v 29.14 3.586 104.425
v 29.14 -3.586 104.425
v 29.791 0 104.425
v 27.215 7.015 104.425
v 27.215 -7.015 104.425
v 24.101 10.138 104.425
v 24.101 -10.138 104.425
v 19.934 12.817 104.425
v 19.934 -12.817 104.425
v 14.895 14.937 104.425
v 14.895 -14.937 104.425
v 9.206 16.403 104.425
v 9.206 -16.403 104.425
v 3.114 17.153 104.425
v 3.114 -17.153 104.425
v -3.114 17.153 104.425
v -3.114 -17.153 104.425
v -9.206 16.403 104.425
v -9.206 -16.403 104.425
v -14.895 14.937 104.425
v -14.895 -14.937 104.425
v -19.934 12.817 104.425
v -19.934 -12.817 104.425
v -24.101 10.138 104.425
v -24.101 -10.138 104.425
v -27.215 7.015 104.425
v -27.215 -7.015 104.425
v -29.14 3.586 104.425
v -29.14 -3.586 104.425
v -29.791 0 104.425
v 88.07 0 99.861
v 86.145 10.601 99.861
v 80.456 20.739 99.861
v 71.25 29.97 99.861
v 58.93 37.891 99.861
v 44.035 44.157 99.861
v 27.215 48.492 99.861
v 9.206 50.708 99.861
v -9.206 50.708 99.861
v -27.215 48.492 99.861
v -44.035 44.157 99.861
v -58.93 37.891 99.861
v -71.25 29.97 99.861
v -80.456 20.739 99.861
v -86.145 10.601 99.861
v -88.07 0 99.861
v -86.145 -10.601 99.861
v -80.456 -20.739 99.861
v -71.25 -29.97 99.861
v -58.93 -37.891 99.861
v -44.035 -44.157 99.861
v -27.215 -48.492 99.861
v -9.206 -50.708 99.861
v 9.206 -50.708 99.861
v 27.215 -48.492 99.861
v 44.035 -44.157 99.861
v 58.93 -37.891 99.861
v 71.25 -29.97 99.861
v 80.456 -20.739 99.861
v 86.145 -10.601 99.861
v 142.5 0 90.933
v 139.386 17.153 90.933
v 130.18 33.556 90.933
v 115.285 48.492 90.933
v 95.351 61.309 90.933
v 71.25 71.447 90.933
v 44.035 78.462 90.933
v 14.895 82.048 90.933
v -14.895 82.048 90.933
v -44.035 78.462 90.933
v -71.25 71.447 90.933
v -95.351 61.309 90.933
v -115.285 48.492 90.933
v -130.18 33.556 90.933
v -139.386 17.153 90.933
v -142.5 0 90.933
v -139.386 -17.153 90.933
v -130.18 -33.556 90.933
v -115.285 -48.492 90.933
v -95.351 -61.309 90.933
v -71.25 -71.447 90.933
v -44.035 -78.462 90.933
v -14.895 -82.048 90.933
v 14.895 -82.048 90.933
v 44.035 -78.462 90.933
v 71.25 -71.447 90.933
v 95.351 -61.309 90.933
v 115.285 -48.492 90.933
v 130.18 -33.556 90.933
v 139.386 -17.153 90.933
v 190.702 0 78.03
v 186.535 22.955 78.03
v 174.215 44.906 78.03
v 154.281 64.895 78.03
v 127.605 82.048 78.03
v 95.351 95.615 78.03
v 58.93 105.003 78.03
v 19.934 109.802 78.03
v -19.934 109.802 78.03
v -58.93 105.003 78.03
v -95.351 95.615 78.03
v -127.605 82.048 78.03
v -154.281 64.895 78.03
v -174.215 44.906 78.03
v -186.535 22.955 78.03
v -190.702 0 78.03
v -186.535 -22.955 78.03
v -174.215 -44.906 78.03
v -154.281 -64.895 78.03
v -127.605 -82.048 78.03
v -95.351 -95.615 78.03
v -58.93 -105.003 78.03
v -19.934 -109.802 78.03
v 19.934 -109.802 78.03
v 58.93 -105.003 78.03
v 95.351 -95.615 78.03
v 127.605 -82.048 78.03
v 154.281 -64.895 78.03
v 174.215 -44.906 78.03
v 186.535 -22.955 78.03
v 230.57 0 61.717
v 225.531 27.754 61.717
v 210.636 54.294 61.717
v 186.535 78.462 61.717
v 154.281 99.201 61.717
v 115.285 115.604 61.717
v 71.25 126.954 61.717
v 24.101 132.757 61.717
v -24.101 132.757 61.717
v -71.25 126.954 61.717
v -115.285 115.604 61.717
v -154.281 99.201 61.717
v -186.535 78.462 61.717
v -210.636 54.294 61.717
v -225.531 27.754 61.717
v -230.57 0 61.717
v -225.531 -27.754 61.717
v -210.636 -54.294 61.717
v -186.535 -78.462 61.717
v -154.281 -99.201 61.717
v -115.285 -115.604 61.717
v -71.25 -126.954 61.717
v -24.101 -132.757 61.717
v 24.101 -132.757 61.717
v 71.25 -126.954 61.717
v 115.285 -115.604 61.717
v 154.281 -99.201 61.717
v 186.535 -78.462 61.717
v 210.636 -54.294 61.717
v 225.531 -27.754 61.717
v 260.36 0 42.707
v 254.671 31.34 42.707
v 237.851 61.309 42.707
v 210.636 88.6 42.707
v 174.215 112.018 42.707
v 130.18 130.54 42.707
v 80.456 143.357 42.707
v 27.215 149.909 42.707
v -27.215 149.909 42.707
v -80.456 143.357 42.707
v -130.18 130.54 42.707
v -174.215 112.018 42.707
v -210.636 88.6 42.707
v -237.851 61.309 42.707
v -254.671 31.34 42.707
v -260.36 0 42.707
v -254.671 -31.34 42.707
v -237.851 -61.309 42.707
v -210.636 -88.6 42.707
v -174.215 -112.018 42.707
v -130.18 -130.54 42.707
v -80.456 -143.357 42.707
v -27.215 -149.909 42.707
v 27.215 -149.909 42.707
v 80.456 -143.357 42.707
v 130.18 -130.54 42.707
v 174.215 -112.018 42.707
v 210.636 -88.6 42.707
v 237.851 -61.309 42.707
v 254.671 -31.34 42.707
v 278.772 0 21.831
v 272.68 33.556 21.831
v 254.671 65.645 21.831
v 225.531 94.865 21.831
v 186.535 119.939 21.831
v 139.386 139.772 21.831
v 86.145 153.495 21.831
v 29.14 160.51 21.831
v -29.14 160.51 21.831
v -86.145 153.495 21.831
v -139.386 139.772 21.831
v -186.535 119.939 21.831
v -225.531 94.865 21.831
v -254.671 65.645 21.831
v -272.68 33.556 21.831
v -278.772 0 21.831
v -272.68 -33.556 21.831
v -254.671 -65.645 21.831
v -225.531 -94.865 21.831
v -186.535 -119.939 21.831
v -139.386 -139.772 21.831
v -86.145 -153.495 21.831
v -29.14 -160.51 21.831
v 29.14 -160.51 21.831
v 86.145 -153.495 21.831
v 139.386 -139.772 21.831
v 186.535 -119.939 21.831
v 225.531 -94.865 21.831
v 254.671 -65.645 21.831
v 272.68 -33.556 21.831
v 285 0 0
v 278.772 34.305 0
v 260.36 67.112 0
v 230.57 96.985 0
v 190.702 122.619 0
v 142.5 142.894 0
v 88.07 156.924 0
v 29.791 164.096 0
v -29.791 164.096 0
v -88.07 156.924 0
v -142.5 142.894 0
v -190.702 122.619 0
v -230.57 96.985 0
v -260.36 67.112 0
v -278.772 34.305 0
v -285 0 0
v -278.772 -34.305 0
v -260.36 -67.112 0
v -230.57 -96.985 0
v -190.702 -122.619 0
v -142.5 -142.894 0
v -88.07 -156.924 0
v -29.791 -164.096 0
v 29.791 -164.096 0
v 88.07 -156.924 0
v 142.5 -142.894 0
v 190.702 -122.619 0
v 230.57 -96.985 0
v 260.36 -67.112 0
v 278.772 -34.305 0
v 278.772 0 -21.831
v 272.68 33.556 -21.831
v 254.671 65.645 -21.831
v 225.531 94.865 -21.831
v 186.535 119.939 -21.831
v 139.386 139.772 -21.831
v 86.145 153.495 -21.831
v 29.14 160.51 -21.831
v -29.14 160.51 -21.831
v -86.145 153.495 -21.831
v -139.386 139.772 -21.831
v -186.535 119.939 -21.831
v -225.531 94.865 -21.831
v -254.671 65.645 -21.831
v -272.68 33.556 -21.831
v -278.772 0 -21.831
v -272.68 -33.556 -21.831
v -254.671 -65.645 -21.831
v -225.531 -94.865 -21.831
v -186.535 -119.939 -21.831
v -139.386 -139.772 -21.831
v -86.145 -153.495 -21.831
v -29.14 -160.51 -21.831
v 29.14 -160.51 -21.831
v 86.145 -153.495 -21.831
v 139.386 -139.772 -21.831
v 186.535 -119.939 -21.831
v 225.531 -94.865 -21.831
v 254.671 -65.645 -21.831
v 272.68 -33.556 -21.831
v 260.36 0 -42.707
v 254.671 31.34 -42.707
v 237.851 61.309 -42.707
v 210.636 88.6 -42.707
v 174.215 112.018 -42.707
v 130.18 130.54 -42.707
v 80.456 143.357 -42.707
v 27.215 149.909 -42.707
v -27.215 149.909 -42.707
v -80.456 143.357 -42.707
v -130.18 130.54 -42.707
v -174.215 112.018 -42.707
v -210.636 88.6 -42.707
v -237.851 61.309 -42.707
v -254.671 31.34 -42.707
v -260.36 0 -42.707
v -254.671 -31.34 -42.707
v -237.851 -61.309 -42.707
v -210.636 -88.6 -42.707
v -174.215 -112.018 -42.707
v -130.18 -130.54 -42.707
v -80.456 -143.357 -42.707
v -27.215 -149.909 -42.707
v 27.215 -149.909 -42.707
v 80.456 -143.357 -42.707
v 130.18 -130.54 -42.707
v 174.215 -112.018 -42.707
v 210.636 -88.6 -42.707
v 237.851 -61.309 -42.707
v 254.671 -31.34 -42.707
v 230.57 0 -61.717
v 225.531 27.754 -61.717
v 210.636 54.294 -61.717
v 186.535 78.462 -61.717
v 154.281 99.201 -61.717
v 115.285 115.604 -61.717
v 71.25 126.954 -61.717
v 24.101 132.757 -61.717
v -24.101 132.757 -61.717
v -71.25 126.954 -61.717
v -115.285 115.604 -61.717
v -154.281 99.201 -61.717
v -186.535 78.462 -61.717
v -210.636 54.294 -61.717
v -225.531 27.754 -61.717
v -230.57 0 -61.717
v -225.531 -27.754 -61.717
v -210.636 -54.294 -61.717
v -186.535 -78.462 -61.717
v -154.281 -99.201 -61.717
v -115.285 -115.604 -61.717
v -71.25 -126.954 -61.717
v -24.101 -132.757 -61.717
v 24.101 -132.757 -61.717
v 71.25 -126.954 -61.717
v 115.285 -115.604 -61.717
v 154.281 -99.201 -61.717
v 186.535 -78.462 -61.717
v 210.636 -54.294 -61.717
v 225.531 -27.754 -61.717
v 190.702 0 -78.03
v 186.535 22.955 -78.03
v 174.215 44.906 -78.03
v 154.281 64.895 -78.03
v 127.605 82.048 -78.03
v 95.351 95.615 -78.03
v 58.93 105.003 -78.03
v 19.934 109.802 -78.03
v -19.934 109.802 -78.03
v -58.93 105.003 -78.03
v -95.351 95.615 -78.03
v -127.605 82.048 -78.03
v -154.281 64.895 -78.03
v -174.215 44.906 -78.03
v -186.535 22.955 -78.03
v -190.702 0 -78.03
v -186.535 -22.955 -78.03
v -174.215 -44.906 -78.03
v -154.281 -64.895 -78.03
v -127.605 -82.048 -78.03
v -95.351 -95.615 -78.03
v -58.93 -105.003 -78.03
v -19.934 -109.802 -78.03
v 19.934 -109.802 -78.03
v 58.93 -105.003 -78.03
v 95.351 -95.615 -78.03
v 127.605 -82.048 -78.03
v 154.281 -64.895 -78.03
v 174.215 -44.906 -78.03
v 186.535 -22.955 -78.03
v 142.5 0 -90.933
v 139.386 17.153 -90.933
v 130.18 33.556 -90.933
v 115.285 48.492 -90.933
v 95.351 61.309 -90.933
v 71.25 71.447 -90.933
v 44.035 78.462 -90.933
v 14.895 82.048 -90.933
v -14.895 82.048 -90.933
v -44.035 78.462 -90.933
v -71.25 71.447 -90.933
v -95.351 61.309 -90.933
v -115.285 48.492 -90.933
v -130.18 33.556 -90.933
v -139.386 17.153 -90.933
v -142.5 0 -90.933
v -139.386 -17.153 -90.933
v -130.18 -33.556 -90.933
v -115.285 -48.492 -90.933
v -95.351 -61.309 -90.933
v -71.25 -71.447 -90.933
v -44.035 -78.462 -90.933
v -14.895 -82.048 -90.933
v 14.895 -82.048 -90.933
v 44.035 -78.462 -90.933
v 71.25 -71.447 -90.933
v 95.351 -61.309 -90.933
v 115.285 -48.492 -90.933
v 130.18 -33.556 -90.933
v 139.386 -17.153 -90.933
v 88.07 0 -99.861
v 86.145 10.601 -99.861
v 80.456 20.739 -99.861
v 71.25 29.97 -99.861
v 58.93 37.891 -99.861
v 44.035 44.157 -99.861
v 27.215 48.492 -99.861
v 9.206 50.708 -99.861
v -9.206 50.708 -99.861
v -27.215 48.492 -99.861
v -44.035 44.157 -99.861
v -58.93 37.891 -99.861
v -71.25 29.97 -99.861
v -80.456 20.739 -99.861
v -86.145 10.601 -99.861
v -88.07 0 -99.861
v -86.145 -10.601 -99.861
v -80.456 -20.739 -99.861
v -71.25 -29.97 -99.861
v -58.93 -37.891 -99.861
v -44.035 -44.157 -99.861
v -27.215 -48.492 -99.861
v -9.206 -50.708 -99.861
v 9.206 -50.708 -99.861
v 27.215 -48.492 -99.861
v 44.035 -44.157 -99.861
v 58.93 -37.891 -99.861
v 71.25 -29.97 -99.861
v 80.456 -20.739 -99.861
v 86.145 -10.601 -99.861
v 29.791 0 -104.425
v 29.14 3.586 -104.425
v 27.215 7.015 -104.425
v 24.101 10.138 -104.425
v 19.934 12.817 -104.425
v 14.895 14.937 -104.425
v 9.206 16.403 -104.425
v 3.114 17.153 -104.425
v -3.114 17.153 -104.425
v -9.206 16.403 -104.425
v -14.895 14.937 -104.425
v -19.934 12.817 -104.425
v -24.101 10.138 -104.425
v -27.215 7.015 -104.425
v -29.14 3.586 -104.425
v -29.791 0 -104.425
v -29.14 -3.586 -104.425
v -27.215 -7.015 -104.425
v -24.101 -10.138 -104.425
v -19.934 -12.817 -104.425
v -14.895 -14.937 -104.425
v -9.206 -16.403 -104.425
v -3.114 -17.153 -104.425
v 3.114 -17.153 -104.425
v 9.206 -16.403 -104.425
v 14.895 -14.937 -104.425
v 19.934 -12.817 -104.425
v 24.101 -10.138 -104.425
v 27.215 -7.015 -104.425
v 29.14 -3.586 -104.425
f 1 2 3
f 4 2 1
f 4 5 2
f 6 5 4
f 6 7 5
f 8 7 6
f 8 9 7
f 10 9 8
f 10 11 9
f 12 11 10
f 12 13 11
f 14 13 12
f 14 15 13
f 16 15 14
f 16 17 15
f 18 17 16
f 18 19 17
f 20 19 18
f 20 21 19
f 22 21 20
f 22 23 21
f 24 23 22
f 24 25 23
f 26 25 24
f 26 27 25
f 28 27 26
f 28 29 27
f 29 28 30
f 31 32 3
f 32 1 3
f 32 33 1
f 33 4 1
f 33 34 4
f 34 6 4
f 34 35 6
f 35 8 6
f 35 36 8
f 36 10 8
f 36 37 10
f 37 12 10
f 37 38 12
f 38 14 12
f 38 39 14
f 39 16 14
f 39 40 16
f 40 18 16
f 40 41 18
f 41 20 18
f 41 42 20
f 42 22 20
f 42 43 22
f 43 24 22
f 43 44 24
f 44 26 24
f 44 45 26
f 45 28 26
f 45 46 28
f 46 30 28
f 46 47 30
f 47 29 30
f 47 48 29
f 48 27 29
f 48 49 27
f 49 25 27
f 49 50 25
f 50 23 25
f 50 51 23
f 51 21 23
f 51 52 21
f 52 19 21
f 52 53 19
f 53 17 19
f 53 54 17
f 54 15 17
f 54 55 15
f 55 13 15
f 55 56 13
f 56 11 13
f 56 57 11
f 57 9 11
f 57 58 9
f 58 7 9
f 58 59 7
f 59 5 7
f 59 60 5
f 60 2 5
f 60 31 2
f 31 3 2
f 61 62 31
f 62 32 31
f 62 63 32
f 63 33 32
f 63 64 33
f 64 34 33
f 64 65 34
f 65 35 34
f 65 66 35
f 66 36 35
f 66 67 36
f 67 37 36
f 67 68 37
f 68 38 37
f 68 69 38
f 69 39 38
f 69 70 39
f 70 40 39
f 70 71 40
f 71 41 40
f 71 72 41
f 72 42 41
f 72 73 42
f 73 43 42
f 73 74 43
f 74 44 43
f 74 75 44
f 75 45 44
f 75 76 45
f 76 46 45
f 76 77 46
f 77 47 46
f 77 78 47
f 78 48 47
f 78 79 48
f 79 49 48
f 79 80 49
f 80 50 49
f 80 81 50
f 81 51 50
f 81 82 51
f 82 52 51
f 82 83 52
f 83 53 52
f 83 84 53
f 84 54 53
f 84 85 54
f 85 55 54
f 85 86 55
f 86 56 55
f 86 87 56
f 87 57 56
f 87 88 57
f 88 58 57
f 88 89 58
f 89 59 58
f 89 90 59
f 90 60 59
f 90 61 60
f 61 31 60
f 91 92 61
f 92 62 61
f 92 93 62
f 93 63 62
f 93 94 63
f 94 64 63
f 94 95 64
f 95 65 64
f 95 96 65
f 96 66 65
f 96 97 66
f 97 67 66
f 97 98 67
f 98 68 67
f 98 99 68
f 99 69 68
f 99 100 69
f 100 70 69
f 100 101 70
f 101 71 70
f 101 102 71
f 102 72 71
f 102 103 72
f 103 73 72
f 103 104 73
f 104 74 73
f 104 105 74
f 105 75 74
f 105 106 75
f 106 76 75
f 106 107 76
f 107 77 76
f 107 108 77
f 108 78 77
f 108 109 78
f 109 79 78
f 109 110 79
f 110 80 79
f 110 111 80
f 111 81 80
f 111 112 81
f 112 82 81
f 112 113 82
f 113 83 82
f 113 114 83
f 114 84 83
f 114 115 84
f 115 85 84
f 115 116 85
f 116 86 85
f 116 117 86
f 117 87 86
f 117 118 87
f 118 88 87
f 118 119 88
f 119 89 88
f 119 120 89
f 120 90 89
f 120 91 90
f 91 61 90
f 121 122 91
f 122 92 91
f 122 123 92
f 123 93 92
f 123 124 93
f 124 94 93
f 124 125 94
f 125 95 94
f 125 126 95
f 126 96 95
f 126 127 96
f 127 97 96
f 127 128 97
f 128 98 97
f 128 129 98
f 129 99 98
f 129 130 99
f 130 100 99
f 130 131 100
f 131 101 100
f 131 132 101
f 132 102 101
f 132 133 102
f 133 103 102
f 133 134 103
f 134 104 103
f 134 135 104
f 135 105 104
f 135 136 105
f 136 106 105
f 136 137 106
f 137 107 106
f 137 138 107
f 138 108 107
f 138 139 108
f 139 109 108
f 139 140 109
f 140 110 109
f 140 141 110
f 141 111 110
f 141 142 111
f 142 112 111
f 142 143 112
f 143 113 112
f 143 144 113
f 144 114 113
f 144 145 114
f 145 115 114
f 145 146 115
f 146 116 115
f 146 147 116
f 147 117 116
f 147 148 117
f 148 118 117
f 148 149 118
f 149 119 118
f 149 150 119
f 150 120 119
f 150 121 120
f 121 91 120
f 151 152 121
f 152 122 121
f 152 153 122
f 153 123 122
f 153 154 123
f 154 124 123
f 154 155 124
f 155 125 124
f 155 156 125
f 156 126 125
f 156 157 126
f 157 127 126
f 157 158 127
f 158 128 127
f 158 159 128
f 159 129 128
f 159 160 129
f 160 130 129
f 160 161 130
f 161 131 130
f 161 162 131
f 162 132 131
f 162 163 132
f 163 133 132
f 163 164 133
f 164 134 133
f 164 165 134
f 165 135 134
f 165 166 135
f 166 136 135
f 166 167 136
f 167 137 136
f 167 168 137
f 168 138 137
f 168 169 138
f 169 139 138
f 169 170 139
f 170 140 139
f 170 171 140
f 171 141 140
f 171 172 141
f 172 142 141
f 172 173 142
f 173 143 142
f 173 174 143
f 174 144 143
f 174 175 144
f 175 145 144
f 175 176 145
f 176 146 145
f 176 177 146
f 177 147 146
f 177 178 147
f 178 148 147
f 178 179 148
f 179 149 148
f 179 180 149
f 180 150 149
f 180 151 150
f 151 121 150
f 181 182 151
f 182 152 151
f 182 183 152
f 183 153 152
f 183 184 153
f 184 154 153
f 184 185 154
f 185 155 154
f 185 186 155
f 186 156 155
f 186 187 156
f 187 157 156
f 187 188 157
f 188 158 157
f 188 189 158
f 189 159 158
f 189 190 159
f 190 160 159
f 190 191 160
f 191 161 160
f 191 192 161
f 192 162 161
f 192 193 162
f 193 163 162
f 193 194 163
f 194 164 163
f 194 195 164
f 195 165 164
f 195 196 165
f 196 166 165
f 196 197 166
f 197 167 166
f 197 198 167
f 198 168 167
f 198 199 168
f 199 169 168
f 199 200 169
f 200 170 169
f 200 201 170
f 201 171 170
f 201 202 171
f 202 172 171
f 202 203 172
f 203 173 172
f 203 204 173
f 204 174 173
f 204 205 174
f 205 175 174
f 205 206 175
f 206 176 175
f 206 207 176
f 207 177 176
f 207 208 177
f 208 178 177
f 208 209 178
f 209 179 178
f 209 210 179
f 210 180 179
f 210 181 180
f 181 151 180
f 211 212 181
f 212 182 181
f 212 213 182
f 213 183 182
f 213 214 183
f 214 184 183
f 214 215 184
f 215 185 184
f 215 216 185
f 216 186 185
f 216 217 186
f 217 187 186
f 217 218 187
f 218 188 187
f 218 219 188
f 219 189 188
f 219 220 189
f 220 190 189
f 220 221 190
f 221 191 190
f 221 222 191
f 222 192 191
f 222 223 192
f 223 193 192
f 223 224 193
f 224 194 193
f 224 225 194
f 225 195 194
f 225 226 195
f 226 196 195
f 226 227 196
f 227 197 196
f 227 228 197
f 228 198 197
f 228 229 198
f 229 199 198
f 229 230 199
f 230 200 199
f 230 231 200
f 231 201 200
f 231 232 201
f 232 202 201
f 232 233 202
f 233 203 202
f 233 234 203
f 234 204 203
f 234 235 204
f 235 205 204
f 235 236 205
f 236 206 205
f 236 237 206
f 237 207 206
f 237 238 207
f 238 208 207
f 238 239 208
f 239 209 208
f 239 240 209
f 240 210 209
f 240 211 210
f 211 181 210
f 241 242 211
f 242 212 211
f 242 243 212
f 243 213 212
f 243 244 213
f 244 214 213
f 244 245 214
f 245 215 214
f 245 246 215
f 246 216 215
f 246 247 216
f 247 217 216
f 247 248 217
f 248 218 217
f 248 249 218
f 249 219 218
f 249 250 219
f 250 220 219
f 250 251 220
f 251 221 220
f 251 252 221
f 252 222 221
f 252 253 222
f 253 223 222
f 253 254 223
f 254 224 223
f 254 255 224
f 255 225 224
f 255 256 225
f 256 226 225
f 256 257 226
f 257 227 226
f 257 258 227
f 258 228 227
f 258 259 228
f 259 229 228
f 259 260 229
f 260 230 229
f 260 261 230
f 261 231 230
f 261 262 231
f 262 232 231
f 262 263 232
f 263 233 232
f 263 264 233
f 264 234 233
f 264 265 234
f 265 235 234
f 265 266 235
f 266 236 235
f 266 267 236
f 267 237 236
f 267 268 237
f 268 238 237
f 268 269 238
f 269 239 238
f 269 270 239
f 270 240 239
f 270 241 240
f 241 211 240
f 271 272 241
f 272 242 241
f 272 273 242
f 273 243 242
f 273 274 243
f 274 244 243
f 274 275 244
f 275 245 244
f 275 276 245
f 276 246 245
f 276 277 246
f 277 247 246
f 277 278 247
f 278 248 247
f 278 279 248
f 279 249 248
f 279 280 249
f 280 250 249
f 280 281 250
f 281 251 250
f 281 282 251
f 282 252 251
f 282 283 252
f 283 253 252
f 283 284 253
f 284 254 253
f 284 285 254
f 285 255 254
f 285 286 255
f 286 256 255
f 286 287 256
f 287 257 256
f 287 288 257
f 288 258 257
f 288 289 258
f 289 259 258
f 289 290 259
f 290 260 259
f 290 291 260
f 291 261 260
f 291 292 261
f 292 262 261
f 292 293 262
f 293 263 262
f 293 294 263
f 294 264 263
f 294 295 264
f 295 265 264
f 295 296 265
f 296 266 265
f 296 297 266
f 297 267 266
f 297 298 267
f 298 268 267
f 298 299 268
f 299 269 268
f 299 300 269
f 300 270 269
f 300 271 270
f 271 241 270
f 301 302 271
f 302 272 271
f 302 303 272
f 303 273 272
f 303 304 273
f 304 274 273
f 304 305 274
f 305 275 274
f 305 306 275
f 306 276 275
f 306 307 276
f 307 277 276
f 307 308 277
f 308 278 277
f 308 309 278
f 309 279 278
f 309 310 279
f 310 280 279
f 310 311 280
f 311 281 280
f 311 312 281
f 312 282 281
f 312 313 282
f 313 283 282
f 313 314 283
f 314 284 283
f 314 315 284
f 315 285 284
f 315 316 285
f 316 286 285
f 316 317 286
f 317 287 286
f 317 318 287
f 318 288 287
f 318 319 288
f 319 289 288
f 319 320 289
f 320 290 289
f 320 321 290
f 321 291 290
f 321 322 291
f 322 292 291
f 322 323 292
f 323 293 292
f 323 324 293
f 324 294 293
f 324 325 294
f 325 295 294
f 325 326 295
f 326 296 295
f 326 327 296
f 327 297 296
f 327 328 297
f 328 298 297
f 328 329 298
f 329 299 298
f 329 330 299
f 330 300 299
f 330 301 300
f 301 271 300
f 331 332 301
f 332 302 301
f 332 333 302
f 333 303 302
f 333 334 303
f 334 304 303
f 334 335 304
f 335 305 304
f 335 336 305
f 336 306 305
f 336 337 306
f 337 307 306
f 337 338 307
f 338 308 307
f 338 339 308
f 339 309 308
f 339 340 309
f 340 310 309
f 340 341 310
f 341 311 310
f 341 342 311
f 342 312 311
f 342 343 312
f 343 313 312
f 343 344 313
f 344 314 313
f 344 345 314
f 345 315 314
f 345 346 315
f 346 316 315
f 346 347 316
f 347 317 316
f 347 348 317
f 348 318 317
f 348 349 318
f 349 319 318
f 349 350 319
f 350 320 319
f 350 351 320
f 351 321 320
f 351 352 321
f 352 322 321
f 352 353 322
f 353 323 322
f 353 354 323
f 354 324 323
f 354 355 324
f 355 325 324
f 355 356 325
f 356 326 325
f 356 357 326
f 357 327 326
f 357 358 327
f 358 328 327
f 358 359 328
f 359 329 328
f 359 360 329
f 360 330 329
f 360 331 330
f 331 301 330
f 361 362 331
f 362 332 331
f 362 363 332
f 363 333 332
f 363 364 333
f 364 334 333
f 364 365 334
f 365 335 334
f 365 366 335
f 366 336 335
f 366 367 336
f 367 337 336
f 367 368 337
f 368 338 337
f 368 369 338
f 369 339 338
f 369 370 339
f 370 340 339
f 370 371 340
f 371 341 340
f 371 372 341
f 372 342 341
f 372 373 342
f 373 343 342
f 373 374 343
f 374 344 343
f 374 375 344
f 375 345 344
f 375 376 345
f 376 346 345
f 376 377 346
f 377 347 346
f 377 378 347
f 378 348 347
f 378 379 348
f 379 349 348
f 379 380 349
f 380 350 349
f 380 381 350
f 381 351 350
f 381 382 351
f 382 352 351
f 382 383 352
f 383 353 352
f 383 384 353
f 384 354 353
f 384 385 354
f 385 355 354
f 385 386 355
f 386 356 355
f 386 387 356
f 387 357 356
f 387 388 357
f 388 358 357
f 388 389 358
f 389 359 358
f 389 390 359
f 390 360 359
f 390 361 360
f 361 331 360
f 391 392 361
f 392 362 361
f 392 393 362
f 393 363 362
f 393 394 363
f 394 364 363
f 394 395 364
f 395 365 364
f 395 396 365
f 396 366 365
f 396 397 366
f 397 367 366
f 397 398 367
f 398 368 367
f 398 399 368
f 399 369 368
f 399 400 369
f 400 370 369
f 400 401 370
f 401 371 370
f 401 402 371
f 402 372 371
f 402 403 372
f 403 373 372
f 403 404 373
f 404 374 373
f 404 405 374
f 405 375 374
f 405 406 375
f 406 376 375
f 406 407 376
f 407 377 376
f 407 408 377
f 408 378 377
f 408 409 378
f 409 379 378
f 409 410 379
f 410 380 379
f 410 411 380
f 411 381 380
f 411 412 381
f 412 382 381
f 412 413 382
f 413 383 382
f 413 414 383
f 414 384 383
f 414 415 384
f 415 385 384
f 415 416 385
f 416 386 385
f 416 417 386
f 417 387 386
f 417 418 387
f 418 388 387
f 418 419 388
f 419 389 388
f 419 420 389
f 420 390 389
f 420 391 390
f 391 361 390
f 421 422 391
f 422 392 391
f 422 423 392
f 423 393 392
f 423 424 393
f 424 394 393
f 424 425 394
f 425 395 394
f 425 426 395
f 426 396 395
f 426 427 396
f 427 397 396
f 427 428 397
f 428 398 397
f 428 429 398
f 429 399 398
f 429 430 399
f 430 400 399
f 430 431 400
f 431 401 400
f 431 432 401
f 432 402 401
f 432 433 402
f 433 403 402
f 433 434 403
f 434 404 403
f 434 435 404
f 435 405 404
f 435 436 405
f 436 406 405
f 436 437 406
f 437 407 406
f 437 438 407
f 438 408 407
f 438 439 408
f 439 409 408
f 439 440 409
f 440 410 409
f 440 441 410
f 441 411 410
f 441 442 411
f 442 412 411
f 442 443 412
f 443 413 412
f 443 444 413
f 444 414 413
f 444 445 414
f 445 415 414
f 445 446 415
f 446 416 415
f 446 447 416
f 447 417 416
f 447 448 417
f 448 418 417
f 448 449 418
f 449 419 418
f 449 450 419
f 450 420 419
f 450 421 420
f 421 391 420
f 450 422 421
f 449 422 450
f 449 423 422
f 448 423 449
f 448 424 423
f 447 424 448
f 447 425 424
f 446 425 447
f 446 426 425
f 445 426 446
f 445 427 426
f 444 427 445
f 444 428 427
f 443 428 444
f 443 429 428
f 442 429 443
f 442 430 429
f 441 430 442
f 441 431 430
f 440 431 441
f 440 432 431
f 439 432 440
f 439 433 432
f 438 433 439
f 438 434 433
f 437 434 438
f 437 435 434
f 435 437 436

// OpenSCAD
// Generated by SolidPython 1.0.1 on 2020-07-29 00:46:54


scale(v = [19, 11, 7]) {
	sphere(r = 15);
}
/***********************************************
*********      SolidPython code:      **********
************************************************
 
# import packages: SolidPython
from solid import *
from solid.utils import *
from itertools import chain, combinations, permutations


class Resize:

    def __init__(self, scad_file):
        self.scad_file = scad_file
        #self.scad_file = import_scad(scad_file)
        # cone/cylinder param:
        self.r1 = 0
        self.r2 = 0
        self.h = 0
        # rectangular prism param:
        self.w = 0
        self.l = 0
        # ellipse param:
        self.r = 0

    # import OpenScad code (file name corresponds to shape)


    # classify shape + parameters
    def assign(self, param1, param2, param3):
        if self.scad_file == 'cone.scad':
            self.r1 = param1
            self.r2 = param2
            self.h = param3
        elif self.scad_file == 'cylinder.scad':
            self.r1 = param1
            self.r2 = param2
            self.h = param3
        elif self.scad_file == 'rectangularPrism.scad':
            self.h = param1
            self.l = param2
            self.w = param3
        else:
            self.r = param1
            self.h = param2

    # resize parameters
    def iterate(self):
        x = range(3, 20, 2)
        i = 1
        if self.scad_file == 'cone.scad':
            tempList = list(permutations(x, 2))
            for temp in tempList:
                param1 = temp[0]
                param2 = temp[1]
                filepath = 'produced_scad_files/' + 'cone' + str(param1) + '_' + str(param2) + '_' + '.scad'
                scad_render_to_file(cylinder(h=param1, r1=param2, r2=0), filepath)

        elif self.scad_file == 'cylinder.scad':
            tempList = list(permutations(x, 3))
            for temp in tempList:
                param1 = temp[0]
                param2 = temp[1]
                filepath = 'produced_scad_files/' + 'cylinder' + str(param1) + '_' + str(param2) + '_' + '.scad'
                scad_render_to_file(cylinder(h=param1, r1=param2, r2=param2), filepath)

        elif self.scad_file == 'rectangularPrism.scad':
            tempList = list(permutations(x, 3))
            for temp in tempList:
                param1 = temp[0]
                param2 = temp[1]
                param3 = temp[2]
                filepath = 'produced_scad_files/' + 'rectangularPrism' + str(param1) + '_' + str(param2) + '_' + str(
                    param3) + '.scad'
                scad_render_to_file(cube(size=(param1, param2, param3)), filepath)

        elif self.scad_file == 'ellipse.scad':
            tempList = list(permutations(x, 4))
            for temp in tempList:
                param1 = temp[0]
                param2 = temp[1]
                param3 = temp[2]
                param4 = temp[3]
                filepath = 'produced_scad_files/' + 'ellipse' + str(param1) + '_' + str(param2) + '_' + str(param3) + '_' + str(param4) + '.scad'
                scad_render_to_file(scale([param1, param2, param3])(sphere(r=param4)), filepath)

    def render_to_scadfile(self):
        scad_render_to_file(scad, 'example.scad') 
 
************************************************/
